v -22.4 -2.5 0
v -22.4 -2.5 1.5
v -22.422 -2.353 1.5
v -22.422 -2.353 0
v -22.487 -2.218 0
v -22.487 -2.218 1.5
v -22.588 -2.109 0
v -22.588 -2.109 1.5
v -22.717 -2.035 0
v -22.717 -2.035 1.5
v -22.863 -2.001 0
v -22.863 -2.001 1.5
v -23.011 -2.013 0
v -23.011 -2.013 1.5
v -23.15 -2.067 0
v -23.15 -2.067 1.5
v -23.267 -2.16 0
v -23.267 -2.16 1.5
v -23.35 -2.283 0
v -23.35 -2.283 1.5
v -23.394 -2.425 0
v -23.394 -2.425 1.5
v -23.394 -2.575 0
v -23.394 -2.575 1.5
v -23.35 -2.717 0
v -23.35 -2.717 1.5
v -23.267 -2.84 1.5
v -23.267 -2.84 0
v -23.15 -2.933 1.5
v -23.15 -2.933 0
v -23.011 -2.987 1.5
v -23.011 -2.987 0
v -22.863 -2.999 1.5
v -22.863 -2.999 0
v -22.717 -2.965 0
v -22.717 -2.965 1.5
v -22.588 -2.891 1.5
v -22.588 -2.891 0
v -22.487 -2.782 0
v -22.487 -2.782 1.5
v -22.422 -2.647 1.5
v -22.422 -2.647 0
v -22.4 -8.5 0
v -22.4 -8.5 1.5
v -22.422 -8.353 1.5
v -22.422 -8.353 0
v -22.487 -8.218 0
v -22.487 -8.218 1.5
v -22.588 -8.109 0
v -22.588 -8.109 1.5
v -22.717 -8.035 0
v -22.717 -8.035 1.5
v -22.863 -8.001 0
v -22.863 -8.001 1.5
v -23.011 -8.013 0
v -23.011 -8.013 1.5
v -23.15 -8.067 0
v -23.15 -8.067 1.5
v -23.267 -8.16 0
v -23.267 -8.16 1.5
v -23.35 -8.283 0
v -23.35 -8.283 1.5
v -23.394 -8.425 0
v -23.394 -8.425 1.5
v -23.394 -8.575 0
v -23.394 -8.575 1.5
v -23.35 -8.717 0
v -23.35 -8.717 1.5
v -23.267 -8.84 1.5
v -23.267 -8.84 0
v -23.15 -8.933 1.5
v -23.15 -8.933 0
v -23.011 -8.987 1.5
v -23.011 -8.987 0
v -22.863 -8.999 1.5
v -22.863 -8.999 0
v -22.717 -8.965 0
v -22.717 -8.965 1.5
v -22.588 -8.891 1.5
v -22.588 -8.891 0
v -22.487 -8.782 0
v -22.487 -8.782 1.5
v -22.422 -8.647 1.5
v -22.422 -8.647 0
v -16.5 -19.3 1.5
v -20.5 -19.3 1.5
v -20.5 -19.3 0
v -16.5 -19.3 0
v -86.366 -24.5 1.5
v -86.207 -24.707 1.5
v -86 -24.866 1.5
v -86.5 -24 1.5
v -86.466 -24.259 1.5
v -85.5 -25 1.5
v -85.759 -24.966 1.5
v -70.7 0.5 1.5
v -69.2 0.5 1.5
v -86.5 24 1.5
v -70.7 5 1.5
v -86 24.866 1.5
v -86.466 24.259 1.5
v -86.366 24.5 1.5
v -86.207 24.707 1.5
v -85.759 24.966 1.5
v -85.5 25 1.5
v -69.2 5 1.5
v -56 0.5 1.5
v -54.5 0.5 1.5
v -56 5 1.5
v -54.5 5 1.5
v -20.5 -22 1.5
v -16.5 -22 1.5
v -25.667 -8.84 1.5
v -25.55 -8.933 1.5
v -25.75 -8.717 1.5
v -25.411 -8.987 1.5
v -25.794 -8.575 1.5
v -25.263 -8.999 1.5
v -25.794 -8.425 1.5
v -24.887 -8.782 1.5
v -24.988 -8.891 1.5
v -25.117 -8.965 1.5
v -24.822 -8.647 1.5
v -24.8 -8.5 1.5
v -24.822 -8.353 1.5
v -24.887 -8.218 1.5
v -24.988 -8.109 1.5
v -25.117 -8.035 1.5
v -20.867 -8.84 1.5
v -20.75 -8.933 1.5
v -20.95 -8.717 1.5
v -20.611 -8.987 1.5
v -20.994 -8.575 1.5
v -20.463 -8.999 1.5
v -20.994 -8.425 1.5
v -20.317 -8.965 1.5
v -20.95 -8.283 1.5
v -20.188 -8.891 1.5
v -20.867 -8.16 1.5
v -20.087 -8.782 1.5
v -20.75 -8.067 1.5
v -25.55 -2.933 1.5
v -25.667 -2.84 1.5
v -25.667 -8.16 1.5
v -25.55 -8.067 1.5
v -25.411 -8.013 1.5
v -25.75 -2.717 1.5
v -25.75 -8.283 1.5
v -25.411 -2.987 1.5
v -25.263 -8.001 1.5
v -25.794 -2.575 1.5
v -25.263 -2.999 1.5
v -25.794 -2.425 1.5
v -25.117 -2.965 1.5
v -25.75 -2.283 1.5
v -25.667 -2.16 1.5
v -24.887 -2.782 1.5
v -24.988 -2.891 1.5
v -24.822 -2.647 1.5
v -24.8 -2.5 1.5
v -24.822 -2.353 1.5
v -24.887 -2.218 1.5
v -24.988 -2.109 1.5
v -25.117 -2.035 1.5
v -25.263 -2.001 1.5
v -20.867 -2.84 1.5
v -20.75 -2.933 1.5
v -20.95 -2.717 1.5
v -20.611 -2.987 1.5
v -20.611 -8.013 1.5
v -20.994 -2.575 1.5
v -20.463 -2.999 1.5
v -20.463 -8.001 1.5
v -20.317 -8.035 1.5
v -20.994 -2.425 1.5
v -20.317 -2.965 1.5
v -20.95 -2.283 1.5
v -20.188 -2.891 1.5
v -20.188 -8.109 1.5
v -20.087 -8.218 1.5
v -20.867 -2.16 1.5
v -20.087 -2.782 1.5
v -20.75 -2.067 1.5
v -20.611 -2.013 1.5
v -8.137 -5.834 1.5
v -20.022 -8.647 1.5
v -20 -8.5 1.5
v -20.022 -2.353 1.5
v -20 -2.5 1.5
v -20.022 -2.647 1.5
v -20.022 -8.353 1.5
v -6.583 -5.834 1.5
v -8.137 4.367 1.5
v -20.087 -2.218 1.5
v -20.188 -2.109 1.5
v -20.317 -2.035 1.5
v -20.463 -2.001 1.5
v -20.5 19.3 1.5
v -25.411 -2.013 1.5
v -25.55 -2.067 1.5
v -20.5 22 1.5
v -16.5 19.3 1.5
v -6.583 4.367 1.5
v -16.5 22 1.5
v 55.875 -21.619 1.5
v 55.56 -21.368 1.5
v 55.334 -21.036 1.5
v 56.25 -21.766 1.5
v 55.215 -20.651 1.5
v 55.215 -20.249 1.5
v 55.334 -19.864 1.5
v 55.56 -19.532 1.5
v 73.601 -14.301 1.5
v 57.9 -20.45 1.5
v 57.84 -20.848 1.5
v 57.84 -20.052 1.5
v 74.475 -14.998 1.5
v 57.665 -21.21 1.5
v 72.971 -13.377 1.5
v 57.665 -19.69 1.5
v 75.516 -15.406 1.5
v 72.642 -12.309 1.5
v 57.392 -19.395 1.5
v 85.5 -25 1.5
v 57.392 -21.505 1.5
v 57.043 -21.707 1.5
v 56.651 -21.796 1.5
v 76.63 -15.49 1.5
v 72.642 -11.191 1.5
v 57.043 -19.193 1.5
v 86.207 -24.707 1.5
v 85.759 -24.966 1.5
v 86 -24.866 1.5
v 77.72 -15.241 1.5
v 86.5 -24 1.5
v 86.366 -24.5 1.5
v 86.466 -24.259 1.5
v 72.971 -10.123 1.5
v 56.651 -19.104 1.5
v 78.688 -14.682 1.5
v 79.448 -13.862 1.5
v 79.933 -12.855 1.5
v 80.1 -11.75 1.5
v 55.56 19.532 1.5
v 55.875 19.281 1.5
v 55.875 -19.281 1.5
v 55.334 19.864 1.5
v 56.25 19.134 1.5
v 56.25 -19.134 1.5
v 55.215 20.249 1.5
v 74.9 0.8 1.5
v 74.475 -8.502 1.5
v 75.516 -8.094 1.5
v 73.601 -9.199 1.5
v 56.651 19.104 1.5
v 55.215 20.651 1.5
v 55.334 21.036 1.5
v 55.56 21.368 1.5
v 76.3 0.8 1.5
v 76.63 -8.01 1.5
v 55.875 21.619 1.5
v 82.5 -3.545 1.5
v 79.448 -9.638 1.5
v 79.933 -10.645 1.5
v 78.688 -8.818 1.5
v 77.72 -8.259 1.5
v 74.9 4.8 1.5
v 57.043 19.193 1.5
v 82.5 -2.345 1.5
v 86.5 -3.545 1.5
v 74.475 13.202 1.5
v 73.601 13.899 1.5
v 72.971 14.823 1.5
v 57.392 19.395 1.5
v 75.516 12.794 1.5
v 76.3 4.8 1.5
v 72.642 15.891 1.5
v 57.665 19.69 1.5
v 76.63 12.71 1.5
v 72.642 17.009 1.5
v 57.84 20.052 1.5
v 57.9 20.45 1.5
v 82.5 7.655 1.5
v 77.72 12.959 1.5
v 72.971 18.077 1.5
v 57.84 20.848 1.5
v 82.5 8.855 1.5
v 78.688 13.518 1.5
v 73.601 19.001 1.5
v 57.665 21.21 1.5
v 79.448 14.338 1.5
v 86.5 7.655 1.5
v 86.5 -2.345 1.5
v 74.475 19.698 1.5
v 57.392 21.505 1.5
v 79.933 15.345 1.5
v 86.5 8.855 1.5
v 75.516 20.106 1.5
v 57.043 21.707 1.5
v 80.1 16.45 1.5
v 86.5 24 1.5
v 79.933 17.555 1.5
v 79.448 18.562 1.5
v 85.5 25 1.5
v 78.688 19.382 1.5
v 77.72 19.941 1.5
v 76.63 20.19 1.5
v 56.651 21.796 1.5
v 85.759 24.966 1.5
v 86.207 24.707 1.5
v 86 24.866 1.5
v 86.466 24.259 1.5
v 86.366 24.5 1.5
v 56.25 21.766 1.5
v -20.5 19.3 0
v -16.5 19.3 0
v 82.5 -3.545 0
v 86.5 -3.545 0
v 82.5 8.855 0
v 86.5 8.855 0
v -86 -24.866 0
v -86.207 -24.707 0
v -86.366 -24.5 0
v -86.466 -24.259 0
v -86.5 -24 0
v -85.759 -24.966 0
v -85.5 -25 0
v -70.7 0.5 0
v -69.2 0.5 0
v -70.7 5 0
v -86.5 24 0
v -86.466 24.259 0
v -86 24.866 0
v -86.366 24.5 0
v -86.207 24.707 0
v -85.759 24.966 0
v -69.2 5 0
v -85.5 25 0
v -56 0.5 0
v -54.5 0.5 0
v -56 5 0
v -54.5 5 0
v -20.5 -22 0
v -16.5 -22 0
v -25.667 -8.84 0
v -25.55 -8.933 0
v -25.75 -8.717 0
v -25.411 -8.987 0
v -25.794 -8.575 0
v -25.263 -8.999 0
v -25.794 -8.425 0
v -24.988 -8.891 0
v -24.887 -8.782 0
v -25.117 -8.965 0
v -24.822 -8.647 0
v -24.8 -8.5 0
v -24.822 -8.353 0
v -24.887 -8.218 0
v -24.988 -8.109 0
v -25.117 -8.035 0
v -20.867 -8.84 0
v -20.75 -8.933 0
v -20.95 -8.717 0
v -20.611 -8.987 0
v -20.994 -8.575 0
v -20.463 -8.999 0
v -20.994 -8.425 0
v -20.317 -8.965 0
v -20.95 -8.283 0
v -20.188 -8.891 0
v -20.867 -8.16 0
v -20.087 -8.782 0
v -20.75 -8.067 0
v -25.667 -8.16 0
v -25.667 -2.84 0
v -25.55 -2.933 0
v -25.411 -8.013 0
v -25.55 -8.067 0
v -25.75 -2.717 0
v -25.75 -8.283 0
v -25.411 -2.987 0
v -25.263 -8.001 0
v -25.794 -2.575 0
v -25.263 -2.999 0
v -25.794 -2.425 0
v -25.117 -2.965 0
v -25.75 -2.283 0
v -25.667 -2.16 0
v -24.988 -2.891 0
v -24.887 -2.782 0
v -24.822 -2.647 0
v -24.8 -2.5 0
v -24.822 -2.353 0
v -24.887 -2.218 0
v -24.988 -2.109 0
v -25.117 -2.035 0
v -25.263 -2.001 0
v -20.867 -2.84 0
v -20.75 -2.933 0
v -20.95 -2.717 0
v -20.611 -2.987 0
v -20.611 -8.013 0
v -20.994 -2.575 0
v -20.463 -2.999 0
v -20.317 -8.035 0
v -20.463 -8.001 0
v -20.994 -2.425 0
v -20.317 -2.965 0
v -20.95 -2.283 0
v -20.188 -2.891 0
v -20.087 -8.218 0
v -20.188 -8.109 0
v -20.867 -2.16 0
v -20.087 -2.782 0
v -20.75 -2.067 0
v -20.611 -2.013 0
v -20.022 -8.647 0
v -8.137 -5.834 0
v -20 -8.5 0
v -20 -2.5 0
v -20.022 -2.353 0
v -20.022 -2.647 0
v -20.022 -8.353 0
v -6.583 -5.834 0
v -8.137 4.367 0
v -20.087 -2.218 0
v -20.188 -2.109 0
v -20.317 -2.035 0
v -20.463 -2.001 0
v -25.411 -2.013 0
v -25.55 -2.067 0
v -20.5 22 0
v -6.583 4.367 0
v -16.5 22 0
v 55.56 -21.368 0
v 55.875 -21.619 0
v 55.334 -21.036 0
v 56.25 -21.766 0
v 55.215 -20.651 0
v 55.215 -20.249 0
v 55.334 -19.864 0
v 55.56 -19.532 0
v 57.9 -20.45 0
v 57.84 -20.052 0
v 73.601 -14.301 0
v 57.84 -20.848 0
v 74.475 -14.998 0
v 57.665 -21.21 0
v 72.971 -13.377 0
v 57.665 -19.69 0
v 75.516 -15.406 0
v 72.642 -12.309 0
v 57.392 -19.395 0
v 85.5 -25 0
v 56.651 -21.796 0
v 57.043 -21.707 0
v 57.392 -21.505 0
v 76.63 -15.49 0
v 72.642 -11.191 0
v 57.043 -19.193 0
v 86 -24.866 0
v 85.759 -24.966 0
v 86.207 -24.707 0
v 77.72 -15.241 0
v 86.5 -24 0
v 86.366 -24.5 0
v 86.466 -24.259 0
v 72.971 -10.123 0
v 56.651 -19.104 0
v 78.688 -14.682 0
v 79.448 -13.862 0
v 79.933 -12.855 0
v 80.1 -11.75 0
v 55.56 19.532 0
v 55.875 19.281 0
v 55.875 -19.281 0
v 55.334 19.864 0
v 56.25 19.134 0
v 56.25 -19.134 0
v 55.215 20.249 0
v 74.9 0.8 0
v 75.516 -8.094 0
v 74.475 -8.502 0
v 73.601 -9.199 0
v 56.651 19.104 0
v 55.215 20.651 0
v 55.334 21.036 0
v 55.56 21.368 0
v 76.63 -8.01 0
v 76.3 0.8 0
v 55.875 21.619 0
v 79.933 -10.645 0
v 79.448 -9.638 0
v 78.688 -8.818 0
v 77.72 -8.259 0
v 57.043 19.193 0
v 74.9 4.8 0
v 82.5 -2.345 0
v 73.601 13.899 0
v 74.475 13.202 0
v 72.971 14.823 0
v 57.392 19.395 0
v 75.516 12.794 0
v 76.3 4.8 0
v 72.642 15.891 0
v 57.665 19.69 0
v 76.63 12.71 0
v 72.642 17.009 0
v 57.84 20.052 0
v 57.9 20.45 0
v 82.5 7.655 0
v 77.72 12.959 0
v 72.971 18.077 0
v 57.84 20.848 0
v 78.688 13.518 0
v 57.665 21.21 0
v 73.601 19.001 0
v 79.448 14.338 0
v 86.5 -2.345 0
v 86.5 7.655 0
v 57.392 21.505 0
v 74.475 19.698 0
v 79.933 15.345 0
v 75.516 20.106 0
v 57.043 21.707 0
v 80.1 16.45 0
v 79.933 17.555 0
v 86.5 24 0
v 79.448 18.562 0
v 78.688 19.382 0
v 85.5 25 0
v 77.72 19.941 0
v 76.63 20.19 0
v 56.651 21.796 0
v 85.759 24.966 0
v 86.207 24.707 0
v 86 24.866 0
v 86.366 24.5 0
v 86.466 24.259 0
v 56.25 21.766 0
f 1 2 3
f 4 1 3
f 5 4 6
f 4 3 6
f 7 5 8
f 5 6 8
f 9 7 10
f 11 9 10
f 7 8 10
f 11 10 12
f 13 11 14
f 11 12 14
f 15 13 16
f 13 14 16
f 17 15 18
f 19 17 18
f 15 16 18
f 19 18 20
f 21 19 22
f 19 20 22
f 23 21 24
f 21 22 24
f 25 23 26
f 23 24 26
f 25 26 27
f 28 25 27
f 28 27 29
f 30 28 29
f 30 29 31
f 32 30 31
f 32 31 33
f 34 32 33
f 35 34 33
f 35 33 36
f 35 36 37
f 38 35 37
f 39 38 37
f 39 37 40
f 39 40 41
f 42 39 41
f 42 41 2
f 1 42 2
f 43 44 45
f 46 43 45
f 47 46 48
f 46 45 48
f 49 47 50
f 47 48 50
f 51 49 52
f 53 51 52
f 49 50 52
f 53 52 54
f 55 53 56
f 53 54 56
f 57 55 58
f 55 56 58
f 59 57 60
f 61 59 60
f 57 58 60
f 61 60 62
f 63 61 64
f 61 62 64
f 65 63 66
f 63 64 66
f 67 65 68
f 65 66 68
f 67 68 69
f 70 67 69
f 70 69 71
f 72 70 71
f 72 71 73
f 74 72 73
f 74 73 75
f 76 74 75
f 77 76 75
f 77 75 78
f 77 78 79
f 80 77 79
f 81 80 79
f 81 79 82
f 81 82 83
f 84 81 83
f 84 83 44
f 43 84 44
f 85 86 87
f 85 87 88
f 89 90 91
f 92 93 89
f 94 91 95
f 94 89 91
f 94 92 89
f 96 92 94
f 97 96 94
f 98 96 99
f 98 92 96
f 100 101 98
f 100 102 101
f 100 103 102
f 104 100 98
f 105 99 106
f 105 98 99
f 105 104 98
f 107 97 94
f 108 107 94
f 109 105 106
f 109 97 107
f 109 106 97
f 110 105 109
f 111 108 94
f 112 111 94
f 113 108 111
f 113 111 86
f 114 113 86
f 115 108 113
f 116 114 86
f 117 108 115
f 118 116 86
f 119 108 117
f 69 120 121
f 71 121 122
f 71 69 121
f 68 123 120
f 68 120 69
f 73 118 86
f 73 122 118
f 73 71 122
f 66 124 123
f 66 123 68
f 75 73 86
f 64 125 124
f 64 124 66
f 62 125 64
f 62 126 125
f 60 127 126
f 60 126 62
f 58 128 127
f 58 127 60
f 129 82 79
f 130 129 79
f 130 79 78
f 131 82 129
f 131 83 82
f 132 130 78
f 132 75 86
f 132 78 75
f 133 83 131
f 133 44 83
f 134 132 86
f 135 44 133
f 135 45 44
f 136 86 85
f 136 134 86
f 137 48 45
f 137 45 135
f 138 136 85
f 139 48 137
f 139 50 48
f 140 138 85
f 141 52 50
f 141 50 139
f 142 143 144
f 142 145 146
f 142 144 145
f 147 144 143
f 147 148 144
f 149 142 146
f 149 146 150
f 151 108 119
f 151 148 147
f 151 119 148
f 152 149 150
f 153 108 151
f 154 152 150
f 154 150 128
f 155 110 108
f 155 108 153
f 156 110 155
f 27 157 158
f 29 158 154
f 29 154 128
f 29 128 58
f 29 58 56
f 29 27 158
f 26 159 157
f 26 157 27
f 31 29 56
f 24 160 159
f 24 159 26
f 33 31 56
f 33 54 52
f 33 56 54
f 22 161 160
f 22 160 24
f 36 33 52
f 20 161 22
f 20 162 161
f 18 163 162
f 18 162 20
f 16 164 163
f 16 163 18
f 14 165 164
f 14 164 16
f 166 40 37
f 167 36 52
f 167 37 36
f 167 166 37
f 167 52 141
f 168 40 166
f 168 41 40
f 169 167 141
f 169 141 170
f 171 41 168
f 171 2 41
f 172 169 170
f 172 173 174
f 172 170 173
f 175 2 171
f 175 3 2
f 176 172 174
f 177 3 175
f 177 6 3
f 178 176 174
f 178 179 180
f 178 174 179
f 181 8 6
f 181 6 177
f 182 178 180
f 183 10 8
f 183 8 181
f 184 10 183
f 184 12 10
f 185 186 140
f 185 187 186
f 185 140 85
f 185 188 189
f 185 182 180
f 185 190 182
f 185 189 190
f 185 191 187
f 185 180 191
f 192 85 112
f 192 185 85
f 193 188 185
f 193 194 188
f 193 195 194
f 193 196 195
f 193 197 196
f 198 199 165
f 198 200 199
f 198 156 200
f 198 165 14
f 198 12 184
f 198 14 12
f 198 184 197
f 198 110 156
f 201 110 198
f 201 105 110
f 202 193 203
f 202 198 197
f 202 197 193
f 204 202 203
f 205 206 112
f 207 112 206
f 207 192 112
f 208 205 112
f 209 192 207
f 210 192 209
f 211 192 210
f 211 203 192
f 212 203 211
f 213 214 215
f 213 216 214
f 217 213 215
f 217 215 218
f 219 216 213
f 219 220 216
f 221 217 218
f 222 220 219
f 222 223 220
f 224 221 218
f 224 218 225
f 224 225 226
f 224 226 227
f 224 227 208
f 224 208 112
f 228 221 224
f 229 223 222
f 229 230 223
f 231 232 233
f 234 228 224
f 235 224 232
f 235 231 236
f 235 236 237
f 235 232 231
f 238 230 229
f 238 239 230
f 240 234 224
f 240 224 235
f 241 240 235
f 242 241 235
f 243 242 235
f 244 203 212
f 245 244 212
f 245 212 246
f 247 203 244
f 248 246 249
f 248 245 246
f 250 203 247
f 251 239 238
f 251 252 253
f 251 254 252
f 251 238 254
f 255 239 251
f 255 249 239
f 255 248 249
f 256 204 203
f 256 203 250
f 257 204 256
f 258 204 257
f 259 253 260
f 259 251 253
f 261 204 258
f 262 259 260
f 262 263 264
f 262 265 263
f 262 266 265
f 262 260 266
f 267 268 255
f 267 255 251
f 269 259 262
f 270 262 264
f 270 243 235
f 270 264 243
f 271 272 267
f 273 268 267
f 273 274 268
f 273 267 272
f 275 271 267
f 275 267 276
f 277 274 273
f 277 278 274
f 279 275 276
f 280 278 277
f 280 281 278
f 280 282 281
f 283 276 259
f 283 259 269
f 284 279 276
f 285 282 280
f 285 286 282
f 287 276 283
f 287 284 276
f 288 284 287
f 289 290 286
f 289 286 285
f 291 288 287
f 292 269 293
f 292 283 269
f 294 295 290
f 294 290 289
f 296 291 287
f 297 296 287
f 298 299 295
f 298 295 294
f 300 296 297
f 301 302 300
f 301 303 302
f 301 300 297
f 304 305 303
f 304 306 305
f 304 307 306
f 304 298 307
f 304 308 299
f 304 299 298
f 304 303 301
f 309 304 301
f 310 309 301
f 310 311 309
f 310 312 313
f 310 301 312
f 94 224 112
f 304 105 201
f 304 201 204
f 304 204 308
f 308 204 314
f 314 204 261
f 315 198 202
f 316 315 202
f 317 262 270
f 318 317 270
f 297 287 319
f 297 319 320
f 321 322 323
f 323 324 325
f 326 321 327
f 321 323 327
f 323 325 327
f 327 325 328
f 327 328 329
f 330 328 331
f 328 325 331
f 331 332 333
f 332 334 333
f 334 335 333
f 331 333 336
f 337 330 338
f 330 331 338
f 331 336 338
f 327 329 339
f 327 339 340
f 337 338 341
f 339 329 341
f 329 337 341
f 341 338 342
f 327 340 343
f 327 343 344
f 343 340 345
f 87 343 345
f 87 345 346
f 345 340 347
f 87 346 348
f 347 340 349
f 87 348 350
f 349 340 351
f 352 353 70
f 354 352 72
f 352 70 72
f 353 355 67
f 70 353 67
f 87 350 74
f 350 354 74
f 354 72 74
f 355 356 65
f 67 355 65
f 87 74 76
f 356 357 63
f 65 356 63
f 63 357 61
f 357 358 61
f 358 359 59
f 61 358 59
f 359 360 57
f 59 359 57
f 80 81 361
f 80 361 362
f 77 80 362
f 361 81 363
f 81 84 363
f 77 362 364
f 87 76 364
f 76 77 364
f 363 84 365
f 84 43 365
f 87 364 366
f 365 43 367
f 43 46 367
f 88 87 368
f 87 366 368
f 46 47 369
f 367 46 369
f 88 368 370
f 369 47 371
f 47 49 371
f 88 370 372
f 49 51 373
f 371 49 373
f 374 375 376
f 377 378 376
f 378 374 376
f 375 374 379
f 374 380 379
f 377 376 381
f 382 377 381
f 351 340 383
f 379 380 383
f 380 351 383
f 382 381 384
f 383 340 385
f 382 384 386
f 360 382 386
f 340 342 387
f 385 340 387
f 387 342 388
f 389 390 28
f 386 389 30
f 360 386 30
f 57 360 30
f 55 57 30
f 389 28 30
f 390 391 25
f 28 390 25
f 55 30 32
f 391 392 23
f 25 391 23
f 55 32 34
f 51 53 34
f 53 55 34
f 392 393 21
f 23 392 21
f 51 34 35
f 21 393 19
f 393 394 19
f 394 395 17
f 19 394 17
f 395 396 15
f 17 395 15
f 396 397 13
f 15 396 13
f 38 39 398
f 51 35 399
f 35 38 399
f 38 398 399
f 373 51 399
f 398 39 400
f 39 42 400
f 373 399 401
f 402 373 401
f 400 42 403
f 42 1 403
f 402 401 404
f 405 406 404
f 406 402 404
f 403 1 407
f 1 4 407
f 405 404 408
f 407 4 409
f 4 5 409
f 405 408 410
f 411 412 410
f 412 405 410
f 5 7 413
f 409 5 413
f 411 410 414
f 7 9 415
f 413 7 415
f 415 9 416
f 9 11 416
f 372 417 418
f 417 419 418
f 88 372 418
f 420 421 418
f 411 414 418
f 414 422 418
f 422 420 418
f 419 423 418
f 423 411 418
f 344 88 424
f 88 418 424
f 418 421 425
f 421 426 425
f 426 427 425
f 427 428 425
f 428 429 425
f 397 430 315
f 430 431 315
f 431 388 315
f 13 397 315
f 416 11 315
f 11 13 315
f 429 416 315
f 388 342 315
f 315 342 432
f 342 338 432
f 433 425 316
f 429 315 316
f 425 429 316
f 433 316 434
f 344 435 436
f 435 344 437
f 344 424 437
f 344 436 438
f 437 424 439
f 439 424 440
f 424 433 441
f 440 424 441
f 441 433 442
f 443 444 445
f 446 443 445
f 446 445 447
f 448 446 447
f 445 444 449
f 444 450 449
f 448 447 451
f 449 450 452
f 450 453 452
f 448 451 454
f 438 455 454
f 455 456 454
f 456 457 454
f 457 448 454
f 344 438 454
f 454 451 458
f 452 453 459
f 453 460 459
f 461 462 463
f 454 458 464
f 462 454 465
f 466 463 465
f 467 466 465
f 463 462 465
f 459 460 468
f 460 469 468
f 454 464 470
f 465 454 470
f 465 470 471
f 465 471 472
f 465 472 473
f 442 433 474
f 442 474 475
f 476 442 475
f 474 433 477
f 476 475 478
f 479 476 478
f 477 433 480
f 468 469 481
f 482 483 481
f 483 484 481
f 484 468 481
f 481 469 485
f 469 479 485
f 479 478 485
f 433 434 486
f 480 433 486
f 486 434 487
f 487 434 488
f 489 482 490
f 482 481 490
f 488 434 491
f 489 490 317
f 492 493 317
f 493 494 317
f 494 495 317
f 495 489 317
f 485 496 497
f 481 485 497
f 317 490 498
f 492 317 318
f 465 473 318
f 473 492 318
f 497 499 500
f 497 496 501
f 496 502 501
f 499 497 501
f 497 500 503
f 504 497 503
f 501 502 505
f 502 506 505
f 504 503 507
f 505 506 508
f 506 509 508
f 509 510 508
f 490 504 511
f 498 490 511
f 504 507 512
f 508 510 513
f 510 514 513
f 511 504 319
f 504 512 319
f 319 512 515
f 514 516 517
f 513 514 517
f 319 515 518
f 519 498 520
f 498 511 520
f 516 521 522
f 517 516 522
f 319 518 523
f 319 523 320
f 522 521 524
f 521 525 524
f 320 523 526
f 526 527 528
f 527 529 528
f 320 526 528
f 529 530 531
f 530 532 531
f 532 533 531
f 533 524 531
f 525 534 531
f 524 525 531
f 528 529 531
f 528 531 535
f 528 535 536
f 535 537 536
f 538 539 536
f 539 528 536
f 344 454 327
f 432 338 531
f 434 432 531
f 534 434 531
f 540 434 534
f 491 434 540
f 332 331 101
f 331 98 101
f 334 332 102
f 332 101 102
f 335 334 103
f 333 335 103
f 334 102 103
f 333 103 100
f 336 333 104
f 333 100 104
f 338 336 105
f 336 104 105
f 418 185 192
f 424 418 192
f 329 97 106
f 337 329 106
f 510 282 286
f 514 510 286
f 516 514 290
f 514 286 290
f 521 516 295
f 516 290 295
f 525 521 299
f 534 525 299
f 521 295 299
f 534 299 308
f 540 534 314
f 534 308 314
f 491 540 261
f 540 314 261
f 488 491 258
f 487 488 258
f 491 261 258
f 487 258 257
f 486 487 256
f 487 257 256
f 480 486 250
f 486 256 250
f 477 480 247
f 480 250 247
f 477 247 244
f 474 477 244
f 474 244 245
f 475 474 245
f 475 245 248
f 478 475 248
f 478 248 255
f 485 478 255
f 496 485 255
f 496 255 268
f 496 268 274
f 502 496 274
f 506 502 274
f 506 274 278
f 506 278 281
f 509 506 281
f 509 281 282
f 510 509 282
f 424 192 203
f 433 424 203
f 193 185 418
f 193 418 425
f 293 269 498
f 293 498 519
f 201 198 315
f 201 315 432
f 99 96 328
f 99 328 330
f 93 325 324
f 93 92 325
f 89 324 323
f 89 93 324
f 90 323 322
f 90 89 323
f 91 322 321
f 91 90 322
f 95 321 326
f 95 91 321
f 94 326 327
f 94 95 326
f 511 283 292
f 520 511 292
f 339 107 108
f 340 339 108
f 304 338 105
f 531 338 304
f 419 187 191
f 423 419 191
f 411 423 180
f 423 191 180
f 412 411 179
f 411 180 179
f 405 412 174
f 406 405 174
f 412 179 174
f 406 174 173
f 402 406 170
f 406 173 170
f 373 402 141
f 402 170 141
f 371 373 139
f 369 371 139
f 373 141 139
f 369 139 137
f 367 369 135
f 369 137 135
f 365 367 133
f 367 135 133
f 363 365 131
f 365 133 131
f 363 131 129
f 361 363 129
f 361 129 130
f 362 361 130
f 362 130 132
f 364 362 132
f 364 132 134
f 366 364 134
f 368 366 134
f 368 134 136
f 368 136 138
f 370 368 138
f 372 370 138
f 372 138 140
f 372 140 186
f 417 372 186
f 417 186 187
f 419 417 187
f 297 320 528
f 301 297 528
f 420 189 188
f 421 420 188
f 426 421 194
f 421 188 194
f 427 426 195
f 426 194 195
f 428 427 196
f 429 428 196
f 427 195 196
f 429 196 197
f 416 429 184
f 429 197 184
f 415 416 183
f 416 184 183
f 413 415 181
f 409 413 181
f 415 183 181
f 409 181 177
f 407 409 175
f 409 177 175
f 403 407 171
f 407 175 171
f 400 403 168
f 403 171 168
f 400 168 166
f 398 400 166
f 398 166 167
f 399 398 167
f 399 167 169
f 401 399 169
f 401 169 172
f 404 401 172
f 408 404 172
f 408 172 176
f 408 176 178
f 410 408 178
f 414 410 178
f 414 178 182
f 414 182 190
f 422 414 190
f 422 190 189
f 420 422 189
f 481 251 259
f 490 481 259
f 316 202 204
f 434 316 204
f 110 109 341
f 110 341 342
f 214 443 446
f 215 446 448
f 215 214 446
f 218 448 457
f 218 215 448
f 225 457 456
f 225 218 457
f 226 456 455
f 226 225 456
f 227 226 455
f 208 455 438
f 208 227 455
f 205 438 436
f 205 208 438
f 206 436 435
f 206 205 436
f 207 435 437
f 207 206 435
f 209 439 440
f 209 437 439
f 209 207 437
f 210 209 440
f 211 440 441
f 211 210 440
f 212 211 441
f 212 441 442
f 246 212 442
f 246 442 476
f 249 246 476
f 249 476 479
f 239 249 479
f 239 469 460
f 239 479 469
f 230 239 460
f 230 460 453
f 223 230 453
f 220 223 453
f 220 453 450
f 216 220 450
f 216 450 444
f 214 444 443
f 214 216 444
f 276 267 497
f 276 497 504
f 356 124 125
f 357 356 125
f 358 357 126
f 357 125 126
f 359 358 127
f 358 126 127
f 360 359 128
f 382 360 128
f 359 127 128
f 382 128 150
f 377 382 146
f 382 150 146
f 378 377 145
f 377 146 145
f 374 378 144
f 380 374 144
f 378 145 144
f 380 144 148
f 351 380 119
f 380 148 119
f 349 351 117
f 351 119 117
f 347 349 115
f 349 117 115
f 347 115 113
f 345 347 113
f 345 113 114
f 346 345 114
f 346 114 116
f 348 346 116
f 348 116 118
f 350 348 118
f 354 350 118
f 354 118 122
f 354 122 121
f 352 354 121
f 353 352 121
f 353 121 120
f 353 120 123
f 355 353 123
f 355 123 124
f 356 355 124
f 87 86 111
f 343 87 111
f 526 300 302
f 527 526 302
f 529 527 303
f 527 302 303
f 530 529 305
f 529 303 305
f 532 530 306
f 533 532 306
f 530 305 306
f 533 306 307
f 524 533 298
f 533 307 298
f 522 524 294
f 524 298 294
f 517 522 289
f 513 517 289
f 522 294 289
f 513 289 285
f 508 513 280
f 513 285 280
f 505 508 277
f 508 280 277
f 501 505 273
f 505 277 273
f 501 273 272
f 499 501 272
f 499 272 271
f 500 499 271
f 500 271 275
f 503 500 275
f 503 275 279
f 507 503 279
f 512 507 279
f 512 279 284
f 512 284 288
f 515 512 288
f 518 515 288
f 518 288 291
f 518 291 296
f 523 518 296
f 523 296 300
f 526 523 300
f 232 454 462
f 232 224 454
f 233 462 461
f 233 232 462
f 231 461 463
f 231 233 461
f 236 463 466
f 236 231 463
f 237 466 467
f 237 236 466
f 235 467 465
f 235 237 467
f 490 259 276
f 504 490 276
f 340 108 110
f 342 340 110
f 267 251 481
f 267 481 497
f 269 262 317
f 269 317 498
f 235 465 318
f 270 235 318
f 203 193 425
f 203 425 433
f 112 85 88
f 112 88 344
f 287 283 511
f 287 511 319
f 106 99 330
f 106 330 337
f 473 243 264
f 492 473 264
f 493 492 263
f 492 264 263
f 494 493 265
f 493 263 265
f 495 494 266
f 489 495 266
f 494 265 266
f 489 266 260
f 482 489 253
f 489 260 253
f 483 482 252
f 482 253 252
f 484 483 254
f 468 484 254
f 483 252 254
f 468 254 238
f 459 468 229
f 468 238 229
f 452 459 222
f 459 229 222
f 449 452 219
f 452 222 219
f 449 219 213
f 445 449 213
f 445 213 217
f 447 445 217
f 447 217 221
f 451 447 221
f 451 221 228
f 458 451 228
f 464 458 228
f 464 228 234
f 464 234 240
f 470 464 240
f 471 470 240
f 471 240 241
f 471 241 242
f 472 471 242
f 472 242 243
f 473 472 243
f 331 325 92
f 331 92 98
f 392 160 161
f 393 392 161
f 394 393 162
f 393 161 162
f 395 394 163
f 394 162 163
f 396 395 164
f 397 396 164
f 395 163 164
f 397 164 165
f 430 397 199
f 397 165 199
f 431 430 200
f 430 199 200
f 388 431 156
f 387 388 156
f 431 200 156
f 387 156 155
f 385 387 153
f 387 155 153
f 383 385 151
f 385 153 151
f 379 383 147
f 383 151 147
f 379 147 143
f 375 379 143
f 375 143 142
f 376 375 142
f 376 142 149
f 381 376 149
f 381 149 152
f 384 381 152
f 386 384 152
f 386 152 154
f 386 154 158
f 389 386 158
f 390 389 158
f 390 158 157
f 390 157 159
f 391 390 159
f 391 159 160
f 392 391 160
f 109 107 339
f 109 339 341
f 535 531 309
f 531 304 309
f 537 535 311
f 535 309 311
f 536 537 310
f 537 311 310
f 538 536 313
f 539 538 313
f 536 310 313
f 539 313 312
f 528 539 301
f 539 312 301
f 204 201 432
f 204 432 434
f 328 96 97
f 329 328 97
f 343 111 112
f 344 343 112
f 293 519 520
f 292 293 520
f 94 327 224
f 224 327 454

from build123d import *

# Parameters (mm, degrees)
F0_W      = 173
F0_H      = 50
F1_DEPTH  = 1.5
F2_W      = 1.5
F2_H      = 4.5
F4_DEPTH  = 1.501
F3_W      = 1.5
F3_H      = 4.5
F5_DEPTH  = 1.501
F6_W      = 4
F6_H      = 2.7
F7_DEPTH  = 1.501
F8_R      = 1.35
F9_DEPTH  = 1.501
F10_R     = 3.75
F11_DEPTH = 1.501
F12_W     = 4
F12_H     = 1.2
F13_DEPTH = 1.501
F14_W     = 1.4
F14_H     = 4
F15_DEPTH = 1.501
F16_R     = 1
F17_R     = 0.5
F18_DEPTH = 1.501
F19_W     = 1.5543582849
F19_H     = 10.2004739456
F20_DEPTH = 1.501


# Not quite as in the source:
# - a pattern or mirror of a feature is missing from the dataset's text; its kind, count and spacing are read off the source's solid


with BuildPart() as f1:
    # F0 (on Top) → F1 (new body)
    with BuildSketch(Plane.XY):
        Rectangle(F0_W, F0_H)
    extrude(amount=F1_DEPTH)

    # F2 (on face) → F4 (cut, through all)
    with BuildSketch(Plane.XY.offset(1.5)):
        with Locations((-69.95, 2.75)):
            Rectangle(F2_W, F2_H)
    extrude(amount=-F4_DEPTH, mode=Mode.SUBTRACT)

    # F3 (on face) → F5 (cut, through all)
    with BuildSketch(Plane.XY.offset(1.5)):
        with Locations((-55.25, 2.75)):
            Rectangle(F3_W, F3_H)
    extrude(amount=-F5_DEPTH, mode=Mode.SUBTRACT)

    # F6 (on face) → F7 (cut, through all)
    with BuildSketch(Plane.XY.offset(1.5)):
        with Locations((-18.5, 20.65)):
            Rectangle(F6_W, F6_H)
    f7 = extrude(amount=-F7_DEPTH, mode=Mode.SUBTRACT)

    # F7_copies: F7 across plane
    add(f7.mirror(Plane(origin=(0, 0, 0), x_dir=(0, 0, -1), z_dir=(0, -1, 0))), mode=Mode.SUBTRACT)

    # F8 (on face) → F9 (cut, through all)
    with BuildSketch(Plane.XY.offset(1.5)):
        with Locations((56.55, 20.45)):
            Circle(F8_R)
    f9 = extrude(amount=-F9_DEPTH, mode=Mode.SUBTRACT)

    # F9_copies: F9 across plane
    add(f9.mirror(Plane(origin=(0, 0, 0), x_dir=(0, 0, -1), z_dir=(0, -1, 0))), mode=Mode.SUBTRACT)

    # F10 (on face) → F11 (cut, through all)
    with BuildSketch(Plane.XY.offset(1.5)):
        with Locations((76.35, 16.45)):
            Circle(F10_R)
        with Locations((76.35, -11.75)):
            Circle(F10_R)
    extrude(amount=-F11_DEPTH, mode=Mode.SUBTRACT)

    # F12 (on face) → F13 (cut, through all)
    with BuildSketch(Plane.XY.offset(1.5)):
        with Locations((84.5, 8.2552298188)):
            Rectangle(F12_W, F12_H)
        with Locations((84.5, -2.9447701812)):
            Rectangle(F12_W, F12_H)
    extrude(amount=-F13_DEPTH, mode=Mode.SUBTRACT)

    # F14 (on face) → F15 (cut, through all)
    with BuildSketch(Plane.XY.offset(1.5)):
        with Locations((75.6, 2.8)):
            Rectangle(F14_W, F14_H)
    extrude(amount=-F15_DEPTH, mode=Mode.SUBTRACT)

    # F16
    f16_edges = [f1.edges().sort_by_distance(p)[0] for p in [
        (-86.5, -25, 0.75),
        (-86.5, 25, 0.75),
        (86.5, 25, 0.75),
        (86.5, -25, 0.75),
    ]]
    fillet(f16_edges, radius=F16_R)

    # F17 (on face) → F18 (cut, through all)
    with BuildSketch(Plane.XY.offset(1.5)):
        with Locations((-25.3, -2.5)):
            Circle(F17_R)
        with Locations((-22.9, -2.5)):
            Circle(F17_R)
        with Locations((-20.5, -2.5)):
            Circle(F17_R)
        with Locations((-20.5, -8.5)):
            Circle(F17_R)
        with Locations((-22.9, -8.5)):
            Circle(F17_R)
        with Locations((-25.3, -8.5)):
            Circle(F17_R)
    extrude(amount=-F18_DEPTH, mode=Mode.SUBTRACT)

    # F19 (on face) → F20 (cut, through all)
    with BuildSketch(Plane.XY.offset(1.5)):
        with Locations((-7.3602499906, -0.7336952258)):
            Rectangle(F19_W, F19_H)
    extrude(amount=-F20_DEPTH, mode=Mode.SUBTRACT)


solid = f1.part
